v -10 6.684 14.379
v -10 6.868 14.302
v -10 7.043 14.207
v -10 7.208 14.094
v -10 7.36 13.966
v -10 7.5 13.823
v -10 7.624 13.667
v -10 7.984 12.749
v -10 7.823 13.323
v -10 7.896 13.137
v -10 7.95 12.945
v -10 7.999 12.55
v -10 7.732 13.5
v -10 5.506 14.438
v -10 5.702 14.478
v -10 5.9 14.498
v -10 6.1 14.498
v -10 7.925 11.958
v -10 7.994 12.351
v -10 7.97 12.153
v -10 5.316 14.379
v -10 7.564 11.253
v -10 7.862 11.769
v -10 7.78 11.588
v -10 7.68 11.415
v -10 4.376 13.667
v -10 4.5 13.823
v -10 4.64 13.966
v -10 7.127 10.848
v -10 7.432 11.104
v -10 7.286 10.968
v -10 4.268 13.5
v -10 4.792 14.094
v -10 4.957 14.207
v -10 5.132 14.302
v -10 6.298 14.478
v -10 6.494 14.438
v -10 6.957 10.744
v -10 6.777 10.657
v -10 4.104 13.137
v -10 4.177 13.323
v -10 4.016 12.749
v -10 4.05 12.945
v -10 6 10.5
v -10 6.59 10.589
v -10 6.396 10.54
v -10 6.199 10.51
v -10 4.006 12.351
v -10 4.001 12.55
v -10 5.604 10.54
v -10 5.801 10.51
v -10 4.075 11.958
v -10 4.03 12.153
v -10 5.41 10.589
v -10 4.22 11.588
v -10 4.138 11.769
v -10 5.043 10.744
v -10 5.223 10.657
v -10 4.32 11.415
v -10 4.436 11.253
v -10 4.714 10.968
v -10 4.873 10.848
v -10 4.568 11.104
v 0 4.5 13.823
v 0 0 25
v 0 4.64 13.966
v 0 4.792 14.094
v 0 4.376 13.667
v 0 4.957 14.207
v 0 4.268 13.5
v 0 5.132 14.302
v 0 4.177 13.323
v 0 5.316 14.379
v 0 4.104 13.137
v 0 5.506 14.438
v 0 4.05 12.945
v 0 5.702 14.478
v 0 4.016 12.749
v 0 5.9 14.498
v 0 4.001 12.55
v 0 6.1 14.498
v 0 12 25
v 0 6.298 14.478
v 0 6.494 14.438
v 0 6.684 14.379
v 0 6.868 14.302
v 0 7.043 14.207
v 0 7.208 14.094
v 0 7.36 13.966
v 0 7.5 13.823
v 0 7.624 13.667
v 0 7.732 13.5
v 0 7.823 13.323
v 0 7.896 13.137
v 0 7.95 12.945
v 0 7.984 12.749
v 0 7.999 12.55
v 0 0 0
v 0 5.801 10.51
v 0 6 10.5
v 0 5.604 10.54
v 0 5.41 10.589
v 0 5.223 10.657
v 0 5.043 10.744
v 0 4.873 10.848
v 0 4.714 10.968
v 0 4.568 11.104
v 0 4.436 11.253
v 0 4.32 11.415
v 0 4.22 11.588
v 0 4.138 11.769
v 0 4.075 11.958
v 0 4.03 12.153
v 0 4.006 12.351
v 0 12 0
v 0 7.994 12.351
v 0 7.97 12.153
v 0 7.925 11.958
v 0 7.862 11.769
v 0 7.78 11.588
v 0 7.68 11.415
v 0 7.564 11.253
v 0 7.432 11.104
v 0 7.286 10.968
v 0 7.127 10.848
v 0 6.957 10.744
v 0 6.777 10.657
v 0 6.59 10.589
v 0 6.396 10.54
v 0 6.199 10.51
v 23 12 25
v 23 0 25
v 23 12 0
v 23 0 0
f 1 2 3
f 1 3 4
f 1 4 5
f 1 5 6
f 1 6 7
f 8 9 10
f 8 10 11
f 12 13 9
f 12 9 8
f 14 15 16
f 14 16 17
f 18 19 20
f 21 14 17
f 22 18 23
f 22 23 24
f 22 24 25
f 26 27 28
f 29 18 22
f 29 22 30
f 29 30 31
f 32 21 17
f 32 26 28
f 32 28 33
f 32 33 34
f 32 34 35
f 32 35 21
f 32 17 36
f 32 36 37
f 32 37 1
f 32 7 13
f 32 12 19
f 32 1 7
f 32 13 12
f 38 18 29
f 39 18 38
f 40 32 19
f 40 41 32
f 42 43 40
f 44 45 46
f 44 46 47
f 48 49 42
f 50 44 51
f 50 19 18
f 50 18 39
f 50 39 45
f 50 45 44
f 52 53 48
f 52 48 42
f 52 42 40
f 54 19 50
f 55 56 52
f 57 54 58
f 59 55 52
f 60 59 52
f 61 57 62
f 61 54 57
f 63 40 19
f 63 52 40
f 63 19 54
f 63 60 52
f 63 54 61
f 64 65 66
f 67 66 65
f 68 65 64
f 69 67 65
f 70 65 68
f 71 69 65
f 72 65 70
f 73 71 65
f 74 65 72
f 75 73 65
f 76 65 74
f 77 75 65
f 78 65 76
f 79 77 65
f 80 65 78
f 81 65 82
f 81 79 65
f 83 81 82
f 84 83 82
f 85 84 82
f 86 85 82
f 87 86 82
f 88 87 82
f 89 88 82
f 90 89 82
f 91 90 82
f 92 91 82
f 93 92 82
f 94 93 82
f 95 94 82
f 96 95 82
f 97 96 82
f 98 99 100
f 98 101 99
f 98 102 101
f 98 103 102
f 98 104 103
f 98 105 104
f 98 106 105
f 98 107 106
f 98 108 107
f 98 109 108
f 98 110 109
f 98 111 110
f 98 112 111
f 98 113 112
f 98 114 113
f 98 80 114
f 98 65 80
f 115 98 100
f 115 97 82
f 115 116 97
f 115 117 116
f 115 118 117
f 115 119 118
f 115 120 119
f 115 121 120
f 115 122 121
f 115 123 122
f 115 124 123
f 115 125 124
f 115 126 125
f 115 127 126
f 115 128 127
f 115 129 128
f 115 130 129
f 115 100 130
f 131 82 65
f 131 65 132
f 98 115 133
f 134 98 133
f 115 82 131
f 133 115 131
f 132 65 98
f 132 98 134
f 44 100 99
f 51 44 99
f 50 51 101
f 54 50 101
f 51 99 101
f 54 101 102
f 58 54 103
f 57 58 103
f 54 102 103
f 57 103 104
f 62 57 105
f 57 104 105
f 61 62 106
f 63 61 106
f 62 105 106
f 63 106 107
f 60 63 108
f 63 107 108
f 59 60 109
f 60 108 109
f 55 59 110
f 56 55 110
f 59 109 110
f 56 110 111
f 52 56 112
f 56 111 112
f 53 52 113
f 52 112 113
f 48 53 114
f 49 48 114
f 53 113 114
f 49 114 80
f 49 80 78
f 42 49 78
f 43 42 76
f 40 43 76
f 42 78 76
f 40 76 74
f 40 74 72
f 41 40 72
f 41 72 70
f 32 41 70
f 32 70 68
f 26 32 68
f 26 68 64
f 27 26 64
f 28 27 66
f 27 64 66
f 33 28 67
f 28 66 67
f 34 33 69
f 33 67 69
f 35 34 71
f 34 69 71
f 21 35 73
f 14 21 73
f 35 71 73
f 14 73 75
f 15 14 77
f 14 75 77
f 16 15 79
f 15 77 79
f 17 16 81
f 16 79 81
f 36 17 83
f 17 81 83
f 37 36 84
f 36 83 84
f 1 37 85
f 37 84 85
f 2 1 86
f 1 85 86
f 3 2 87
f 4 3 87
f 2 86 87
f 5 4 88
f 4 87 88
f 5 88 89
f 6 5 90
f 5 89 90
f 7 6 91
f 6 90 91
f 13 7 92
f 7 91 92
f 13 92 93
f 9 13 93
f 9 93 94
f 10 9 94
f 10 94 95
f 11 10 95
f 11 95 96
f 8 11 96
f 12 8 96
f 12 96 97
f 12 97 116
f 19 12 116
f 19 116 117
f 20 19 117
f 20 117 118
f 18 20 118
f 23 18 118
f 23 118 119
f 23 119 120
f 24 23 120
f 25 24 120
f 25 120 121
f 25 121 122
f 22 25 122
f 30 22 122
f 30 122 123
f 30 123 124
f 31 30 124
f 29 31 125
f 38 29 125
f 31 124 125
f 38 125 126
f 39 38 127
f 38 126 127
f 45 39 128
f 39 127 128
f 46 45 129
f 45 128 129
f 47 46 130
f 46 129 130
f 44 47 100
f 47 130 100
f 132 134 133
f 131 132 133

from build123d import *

# Parameters (mm, degrees)
ESQUISSE1_W        = 23
ESQUISSE1_H        = 12
BOSS_EXTRU_1_DEPTH = 25
ESQUISSE4_R        = 2
BOSS_EXTRU_2_DEPTH = 10


with BuildPart() as part:
    # Esquisse1 → Boss.-Extru.1 (new body)
    with BuildSketch(Plane.XY):
        with Locations((11.5, 6)):
            Rectangle(ESQUISSE1_W, ESQUISSE1_H)
    extrude(amount=BOSS_EXTRU_1_DEPTH)

    # Esquisse4 → Boss.-Extru.2 (add)
    with BuildSketch(Plane.ZY):
        with Locations(Location((12.5, 6, 0), (0, 0, 180))):
            Circle(ESQUISSE4_R)
    extrude(amount=BOSS_EXTRU_2_DEPTH)


solid = part.part
